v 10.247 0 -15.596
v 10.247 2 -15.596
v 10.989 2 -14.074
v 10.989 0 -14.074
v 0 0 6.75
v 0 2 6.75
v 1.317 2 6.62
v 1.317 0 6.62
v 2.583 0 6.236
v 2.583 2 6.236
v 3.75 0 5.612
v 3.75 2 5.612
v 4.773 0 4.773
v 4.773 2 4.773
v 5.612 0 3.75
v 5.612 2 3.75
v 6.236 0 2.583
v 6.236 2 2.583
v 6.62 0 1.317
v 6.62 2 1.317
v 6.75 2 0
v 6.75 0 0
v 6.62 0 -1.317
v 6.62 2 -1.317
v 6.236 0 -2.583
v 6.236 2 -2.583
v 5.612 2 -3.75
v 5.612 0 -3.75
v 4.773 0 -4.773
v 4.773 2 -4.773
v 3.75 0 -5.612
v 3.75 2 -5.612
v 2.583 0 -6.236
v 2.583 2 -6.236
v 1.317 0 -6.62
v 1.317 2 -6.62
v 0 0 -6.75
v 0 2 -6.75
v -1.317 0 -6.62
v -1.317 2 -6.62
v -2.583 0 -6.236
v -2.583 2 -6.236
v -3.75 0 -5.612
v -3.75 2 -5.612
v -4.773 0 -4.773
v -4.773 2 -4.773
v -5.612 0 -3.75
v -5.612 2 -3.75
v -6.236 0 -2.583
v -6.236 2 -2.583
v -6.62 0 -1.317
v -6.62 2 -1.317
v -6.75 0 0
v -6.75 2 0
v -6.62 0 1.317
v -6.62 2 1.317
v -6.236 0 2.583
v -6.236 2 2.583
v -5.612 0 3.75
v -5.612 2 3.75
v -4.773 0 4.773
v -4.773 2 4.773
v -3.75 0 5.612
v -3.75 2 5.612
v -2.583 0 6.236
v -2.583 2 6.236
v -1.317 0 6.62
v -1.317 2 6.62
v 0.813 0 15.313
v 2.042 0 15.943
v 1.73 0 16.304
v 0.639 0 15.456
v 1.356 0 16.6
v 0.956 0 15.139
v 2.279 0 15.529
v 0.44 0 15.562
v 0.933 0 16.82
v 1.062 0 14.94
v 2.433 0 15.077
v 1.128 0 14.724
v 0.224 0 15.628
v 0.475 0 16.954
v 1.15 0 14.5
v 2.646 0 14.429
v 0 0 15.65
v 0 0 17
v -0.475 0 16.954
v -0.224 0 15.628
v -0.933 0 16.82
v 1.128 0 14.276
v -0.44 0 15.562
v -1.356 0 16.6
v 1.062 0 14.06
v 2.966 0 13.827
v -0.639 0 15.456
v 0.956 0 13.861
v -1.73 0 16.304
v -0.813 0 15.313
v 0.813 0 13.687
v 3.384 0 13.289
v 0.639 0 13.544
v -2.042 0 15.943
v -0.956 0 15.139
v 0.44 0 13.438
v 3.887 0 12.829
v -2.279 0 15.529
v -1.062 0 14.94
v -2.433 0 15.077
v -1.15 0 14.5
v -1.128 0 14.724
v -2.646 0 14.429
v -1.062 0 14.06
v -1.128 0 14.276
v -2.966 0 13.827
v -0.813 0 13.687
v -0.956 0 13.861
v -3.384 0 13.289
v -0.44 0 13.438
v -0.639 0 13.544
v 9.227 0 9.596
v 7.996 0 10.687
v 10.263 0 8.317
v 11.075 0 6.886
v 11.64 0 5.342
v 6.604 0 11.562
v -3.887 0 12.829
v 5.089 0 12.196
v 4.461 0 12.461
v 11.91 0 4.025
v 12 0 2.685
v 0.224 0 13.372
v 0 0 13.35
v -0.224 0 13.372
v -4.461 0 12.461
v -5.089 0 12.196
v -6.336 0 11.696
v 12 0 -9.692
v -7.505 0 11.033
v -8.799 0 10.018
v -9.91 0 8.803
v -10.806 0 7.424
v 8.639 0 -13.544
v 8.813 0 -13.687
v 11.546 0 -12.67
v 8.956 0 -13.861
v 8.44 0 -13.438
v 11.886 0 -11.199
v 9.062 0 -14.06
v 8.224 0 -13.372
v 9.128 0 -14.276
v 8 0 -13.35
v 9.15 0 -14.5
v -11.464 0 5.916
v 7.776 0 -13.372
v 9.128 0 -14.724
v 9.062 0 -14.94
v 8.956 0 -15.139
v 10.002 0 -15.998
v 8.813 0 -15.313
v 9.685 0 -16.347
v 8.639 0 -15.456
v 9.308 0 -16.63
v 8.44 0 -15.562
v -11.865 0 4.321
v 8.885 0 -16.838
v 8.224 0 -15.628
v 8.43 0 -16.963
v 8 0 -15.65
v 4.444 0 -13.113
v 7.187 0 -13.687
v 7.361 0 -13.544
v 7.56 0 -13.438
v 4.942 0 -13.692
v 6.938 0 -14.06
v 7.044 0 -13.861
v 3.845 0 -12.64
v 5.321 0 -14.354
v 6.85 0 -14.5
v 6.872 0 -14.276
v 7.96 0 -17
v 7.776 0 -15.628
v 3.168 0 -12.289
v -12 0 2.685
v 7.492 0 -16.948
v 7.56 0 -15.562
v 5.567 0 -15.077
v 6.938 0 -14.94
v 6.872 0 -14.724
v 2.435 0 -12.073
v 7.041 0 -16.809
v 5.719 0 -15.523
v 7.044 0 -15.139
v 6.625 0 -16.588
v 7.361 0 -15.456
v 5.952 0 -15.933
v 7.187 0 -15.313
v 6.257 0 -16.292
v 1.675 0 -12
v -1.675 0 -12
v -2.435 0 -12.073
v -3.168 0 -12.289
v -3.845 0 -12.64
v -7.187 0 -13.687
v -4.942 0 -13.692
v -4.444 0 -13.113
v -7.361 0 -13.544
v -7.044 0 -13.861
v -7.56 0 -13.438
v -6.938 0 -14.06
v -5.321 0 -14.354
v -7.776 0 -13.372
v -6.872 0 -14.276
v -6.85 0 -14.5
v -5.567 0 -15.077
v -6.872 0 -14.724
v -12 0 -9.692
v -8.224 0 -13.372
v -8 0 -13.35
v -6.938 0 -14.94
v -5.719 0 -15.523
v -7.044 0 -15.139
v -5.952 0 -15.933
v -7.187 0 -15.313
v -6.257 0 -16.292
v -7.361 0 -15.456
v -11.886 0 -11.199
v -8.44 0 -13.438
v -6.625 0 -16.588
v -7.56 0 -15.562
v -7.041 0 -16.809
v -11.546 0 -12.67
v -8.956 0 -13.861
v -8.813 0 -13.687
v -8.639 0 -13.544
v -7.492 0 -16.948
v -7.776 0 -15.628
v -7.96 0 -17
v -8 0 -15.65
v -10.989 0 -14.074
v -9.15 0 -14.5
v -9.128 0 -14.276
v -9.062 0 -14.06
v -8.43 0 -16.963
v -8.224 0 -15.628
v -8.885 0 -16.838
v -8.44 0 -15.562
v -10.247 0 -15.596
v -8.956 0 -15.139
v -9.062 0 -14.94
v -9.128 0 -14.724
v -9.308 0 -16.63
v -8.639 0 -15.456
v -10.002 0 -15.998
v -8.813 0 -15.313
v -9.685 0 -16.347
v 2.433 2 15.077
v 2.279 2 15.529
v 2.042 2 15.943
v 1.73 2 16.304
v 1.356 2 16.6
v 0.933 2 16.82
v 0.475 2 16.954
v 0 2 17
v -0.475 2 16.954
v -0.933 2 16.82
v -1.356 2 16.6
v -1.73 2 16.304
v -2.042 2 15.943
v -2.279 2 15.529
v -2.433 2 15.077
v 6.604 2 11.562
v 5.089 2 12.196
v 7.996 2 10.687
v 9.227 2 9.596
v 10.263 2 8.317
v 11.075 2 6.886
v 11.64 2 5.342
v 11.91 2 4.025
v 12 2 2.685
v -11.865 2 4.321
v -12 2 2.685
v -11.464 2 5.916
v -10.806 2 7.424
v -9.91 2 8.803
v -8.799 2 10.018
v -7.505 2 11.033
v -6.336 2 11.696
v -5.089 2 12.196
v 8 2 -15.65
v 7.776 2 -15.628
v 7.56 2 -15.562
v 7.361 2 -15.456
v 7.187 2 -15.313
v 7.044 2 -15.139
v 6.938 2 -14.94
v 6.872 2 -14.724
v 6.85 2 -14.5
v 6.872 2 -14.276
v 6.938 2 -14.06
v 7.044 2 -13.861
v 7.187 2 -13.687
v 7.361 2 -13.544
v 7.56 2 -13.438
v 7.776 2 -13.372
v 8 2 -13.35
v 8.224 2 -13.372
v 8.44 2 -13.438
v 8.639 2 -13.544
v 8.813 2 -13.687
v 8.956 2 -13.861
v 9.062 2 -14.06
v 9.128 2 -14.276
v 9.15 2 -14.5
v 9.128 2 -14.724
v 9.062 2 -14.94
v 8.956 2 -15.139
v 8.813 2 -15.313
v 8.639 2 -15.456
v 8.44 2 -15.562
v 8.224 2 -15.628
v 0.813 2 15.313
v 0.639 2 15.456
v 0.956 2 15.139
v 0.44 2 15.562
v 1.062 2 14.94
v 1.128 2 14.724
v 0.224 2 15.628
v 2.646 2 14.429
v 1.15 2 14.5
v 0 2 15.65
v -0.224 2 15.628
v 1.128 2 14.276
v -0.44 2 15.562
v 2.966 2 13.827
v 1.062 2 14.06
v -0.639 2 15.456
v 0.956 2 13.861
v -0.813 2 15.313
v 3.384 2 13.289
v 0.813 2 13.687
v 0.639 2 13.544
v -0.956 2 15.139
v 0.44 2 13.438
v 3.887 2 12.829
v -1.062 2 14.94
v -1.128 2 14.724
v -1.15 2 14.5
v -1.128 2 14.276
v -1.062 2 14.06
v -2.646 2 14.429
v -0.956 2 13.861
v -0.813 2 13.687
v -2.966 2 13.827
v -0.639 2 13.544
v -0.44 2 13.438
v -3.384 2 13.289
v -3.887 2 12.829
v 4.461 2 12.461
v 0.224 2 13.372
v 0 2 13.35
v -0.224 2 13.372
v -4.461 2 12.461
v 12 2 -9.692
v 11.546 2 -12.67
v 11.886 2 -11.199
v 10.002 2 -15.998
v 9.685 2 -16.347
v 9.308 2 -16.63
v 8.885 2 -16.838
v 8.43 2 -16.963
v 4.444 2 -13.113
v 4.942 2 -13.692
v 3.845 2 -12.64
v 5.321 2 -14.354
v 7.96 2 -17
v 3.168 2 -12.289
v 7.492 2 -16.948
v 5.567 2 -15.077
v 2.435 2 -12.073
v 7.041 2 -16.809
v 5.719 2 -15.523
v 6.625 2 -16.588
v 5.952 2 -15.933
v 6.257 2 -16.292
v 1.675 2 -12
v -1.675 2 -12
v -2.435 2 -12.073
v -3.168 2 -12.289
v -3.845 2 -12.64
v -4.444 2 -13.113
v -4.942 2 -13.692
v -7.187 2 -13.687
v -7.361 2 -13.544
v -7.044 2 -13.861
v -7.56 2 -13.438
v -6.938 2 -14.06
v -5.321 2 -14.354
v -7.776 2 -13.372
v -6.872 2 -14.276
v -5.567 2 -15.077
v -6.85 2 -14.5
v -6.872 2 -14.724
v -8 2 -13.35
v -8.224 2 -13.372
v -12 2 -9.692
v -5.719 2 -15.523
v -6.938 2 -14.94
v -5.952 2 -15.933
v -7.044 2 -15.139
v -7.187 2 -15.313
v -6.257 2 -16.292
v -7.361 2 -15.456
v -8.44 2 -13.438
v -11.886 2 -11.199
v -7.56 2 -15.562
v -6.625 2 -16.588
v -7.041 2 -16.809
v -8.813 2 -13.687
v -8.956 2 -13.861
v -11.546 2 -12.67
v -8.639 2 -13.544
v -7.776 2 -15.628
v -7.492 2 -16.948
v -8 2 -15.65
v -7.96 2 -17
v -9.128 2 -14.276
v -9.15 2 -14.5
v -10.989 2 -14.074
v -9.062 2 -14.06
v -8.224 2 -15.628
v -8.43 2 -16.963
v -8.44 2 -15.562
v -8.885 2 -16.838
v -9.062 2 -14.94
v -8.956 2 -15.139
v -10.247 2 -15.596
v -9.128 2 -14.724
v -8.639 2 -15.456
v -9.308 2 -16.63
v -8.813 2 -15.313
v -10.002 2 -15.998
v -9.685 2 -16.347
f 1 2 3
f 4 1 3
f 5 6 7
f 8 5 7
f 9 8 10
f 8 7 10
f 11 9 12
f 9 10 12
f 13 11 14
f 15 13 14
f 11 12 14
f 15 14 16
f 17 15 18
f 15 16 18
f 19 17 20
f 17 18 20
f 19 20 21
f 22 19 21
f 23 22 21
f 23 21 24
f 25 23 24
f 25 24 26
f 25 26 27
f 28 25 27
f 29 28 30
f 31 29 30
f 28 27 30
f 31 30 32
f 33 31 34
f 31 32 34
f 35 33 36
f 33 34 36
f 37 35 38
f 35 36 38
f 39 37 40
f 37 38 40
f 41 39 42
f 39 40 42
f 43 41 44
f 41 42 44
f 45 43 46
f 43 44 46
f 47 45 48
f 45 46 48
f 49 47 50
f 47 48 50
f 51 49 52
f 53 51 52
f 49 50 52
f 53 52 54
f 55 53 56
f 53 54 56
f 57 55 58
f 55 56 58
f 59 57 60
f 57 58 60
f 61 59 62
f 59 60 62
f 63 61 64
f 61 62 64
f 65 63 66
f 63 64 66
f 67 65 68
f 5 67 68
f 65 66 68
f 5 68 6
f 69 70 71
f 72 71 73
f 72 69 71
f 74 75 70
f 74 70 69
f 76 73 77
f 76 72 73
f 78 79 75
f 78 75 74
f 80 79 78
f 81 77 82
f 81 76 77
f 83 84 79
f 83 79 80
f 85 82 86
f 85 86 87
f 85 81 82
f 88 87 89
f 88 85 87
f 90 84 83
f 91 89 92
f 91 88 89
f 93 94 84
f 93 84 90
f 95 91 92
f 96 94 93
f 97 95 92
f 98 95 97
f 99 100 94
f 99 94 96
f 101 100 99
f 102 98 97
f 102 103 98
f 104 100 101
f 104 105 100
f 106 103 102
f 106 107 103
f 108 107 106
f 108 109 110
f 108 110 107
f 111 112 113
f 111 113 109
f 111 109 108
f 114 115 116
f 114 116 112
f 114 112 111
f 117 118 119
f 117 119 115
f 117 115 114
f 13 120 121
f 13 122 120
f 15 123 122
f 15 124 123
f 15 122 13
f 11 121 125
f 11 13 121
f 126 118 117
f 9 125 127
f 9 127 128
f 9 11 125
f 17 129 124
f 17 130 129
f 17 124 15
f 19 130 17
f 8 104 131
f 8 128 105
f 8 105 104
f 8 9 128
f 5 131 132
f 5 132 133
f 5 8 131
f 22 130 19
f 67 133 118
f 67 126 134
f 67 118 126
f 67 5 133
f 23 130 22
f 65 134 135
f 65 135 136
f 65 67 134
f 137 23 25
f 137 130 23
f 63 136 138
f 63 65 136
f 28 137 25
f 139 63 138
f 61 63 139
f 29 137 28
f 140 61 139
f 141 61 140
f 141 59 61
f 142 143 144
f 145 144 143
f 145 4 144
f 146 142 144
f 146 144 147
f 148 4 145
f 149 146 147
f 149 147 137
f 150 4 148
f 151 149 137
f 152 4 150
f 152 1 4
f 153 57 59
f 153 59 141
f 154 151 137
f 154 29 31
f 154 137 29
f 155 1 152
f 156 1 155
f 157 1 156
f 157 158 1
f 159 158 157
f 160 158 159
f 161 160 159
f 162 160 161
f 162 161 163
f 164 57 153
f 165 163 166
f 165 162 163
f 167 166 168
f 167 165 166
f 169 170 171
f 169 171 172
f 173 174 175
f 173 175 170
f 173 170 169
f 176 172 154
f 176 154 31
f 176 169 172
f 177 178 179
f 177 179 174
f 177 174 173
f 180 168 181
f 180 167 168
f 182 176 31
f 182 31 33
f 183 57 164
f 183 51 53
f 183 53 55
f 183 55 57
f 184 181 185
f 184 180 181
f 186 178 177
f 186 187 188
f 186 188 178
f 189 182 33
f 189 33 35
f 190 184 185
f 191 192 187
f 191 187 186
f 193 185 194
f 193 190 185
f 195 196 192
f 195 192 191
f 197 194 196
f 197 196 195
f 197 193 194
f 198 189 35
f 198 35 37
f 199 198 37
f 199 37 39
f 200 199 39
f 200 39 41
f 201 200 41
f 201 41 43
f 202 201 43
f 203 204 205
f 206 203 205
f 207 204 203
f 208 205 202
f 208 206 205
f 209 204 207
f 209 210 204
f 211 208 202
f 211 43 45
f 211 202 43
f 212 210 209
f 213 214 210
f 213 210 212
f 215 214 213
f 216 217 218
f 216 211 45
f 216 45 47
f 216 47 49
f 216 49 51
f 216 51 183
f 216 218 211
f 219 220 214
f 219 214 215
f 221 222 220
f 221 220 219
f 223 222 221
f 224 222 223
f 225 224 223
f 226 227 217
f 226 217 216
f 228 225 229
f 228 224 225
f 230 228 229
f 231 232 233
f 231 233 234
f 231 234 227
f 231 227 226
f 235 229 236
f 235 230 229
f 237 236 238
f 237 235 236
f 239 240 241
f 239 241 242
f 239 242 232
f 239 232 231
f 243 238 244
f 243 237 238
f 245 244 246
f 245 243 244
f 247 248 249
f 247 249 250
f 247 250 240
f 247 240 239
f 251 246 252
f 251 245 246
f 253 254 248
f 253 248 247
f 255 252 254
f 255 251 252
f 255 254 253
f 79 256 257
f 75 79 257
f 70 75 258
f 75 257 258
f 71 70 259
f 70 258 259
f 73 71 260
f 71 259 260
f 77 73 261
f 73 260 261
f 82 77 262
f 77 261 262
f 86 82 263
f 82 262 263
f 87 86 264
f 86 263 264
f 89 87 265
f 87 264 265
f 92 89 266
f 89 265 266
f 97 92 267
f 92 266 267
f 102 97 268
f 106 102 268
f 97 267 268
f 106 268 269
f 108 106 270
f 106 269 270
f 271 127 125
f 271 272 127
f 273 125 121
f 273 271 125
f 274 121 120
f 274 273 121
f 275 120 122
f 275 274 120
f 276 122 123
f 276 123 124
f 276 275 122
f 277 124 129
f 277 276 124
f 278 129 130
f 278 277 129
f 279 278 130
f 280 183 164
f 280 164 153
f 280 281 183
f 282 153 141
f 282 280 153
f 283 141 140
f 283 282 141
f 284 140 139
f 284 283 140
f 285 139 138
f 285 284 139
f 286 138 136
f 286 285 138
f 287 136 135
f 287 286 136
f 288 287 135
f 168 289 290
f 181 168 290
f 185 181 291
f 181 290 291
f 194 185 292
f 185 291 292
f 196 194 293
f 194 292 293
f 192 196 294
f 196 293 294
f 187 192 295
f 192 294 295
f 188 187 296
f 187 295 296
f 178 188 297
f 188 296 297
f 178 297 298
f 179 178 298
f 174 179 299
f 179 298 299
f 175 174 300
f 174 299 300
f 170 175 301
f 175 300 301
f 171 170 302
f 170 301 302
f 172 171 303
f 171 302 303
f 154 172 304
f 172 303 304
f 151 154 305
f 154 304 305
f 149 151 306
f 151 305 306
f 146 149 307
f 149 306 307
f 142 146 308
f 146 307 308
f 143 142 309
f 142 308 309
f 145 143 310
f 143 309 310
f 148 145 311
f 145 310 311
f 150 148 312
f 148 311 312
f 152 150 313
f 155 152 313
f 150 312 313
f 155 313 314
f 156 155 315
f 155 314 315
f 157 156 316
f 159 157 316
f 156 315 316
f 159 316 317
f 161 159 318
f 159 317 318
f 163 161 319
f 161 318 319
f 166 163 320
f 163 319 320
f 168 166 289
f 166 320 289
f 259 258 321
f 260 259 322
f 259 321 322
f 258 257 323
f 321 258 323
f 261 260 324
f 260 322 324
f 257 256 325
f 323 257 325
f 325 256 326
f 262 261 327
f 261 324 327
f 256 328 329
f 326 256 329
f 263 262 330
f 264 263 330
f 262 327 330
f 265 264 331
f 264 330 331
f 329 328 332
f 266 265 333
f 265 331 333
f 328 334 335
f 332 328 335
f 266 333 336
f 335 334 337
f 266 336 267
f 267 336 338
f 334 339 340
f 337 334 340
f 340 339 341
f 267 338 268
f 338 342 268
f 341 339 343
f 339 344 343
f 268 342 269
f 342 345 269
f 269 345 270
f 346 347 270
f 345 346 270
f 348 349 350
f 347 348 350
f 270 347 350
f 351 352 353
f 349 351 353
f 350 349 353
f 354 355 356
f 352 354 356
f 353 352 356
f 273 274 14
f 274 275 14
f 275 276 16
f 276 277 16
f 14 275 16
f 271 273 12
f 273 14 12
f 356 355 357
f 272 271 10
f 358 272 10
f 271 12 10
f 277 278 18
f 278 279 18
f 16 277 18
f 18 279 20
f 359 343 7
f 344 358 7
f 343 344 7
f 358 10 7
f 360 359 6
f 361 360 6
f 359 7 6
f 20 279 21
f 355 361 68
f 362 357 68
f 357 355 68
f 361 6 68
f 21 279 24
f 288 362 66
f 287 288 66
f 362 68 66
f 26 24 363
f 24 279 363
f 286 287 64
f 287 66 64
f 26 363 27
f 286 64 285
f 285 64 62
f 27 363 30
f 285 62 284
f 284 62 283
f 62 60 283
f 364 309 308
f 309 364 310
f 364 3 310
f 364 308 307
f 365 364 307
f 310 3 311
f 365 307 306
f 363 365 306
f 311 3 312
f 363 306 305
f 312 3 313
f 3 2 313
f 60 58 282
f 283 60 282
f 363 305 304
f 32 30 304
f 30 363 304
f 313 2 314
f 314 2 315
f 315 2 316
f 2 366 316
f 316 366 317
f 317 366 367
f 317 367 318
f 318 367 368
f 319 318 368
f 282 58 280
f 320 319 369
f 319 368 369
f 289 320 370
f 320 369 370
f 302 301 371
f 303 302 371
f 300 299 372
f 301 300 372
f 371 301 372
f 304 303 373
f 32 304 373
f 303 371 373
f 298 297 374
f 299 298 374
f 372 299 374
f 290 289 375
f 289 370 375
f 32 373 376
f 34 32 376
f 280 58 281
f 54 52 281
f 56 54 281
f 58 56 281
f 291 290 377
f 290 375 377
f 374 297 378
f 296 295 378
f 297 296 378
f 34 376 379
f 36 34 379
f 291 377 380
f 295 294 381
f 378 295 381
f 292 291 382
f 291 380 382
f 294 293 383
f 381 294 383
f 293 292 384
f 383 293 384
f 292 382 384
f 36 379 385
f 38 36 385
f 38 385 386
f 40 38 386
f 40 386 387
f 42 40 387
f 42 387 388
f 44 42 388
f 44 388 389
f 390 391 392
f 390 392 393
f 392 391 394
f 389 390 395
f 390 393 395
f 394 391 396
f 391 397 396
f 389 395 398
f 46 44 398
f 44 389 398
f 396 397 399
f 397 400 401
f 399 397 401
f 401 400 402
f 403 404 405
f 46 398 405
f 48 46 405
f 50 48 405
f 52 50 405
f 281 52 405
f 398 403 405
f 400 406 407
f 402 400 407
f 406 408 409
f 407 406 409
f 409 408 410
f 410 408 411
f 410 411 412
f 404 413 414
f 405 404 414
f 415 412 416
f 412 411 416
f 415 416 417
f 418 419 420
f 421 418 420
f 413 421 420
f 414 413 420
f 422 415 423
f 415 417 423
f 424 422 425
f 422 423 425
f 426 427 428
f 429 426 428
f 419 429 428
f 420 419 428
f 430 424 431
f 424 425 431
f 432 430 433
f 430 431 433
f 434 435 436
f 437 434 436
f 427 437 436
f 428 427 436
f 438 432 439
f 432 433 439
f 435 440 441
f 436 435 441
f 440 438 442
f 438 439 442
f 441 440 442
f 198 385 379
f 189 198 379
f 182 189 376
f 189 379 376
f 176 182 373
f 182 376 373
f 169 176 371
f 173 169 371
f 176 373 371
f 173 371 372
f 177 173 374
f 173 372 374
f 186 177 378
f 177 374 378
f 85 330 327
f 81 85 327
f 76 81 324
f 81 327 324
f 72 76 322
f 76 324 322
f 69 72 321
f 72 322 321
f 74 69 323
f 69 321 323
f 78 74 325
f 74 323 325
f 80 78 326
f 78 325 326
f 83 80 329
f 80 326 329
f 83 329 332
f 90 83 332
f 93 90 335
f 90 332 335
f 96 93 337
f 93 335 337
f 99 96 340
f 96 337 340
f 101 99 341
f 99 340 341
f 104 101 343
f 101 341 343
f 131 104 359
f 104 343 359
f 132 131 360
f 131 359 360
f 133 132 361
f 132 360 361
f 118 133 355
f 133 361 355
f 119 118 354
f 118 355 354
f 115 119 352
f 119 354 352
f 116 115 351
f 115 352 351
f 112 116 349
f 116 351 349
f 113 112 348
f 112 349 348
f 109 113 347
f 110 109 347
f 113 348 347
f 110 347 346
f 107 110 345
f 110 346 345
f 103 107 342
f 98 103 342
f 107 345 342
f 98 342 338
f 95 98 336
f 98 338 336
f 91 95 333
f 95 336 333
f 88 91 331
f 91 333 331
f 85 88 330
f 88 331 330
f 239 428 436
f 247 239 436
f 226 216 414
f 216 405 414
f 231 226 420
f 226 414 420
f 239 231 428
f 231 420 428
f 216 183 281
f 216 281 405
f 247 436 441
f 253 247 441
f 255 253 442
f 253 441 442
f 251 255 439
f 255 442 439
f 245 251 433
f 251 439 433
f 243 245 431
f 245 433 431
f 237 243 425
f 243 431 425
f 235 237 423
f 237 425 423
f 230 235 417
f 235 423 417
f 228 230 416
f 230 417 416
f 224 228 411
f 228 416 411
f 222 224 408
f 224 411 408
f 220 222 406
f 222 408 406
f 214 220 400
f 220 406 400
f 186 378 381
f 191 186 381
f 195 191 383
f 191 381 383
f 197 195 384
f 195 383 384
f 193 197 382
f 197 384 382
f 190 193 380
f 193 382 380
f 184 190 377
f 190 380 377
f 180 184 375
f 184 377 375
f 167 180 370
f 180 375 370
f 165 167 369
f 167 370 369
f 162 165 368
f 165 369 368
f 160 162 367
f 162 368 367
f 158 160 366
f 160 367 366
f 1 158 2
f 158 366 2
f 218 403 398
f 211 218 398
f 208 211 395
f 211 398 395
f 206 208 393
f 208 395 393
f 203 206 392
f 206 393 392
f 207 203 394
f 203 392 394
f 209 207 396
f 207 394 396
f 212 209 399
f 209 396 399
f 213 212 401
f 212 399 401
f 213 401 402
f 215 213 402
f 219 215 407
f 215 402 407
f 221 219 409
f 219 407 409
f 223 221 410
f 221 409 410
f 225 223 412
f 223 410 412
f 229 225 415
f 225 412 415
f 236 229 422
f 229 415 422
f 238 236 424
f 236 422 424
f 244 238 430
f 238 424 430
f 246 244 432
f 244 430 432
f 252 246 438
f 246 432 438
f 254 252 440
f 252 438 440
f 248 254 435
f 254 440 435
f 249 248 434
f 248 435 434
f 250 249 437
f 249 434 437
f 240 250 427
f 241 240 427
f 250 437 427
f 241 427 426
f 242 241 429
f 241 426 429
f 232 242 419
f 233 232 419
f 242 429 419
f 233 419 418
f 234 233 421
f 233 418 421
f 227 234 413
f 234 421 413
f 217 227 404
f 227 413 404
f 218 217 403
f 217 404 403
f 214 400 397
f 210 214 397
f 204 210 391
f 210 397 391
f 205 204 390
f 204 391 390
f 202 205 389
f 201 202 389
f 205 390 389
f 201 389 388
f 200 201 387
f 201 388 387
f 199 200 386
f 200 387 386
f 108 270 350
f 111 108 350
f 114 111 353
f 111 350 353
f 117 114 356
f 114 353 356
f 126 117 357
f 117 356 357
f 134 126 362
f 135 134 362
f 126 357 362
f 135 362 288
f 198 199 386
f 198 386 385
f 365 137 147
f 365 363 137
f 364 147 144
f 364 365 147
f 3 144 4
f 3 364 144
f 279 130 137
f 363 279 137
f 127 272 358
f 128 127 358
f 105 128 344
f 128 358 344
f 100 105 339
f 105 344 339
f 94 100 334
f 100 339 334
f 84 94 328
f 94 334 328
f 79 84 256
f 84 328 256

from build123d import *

# Parameters (mm, degrees)
SKETCH_1_W          = 24
SKETCH_1_H          = 24
EXTRUDE_1_DEPTH     = 2
SKETCH_2_R          = 1.15
EXTRUDE_2_DEPTH     = 2
FILLET_1_R          = 10
SKETCH_3_R          = 6.75
CUT_EXTRUDE_1_DEPTH = 2
FILLET_2_R          = 10


with BuildPart() as part:
    # Эскиз1 → Бобышка-Вытянуть1 (new body)
    with BuildSketch(Plane(origin=(0, 0, 0), x_dir=(1, 0, 0), z_dir=(0, 1, 0))):
        Rectangle(SKETCH_1_W, SKETCH_1_H)
    extrude(amount=EXTRUDE_1_DEPTH)

    # Эскиз2 → Бобышка-Вытянуть2 (add)
    # profile 1 of 3: a face of its own
    with BuildSketch(Plane(origin=(0, 2, 0), x_dir=(1, 0, 0), z_dir=(0, 1, 0))):
        with BuildLine():
            Line((-6.32455532, -12), (6.32455532, -12))
            ThreePointArc((6.32455532, -12), (3.843860629, -12.862141838), (2.432521277, -15.076923077))
            ThreePointArc((2.432521277, -15.076923077), (0, -17), (-2.432521277, -15.076923077))
            ThreePointArc((-2.432521277, -15.076923077), (-3.843860629, -12.862141838), (-6.32455532, -12))
        make_face()
        with Locations(Location((0, -14.5, 0), (0, 0, 270))):
            Circle(SKETCH_2_R, mode=Mode.SUBTRACT)
    # profile 2 of 3: a face of its own
    with BuildSketch(Plane(origin=(0, 2, 0), x_dir=(1, 0, 0), z_dir=(0, 1, 0))):
        with BuildLine():
            Line((-12, 12), (-10.247191011, 15.595505618))
            ThreePointArc((-10.247191011, 15.595505618), (-7.72464788, 16.984789973), (-5.567478723, 15.076923077))
            ThreePointArc((-5.567478723, 15.076923077), (-4.156139371, 12.862141838), (-1.67544468, 12))
            Line((-1.67544468, 12), (-12, 12))
        make_face()
        with Locations(Location((-8, 14.5, 0), (0, 0, 270))):
            Circle(SKETCH_2_R, mode=Mode.SUBTRACT)
    # profile 3 of 3: a face of its own
    with BuildSketch(Plane(origin=(0, 2, 0), x_dir=(1, 0, 0), z_dir=(0, 1, 0))):
        with BuildLine():
            Line((12, 12), (1.67544468, 12))
            ThreePointArc((1.67544468, 12), (4.156139371, 12.862141838), (5.567478723, 15.076923077))
            ThreePointArc((5.567478723, 15.076923077), (7.72464788, 16.984789973), (10.247191011, 15.595505618))
            Line((10.247191011, 15.595505618), (12, 12))
        make_face()
        with Locations(Location((8, 14.5, 0), (0, 0, 90))):
            Circle(SKETCH_2_R, mode=Mode.SUBTRACT)
    extrude(amount=-EXTRUDE_2_DEPTH)

    # Скругление1
    fillet_1_edges = [part.edges().sort_by_distance(p)[0] for p in [
        (12, 1, 12),
        (-12, 1, 12),
    ]]
    fillet(fillet_1_edges, radius=FILLET_1_R)

    # Эскиз3 → Вырез-Вытянуть1 (cut)
    with BuildSketch(Plane(origin=(0, 2, 0), x_dir=(1, 0, 0), z_dir=(0, 1, 0))):
        with Locations(Location((0, 0, 0), (0, 0, 270))):
            Circle(SKETCH_3_R)
    extrude(amount=-CUT_EXTRUDE_1_DEPTH, mode=Mode.SUBTRACT)

    # Скругление2
    fillet_2_edges = [part.edges().sort_by_distance(p)[0] for p in [
        (-12, 1, -12),
        (12, 1, -12),
    ]]
    fillet(fillet_2_edges, radius=FILLET_2_R)


solid = part.part
